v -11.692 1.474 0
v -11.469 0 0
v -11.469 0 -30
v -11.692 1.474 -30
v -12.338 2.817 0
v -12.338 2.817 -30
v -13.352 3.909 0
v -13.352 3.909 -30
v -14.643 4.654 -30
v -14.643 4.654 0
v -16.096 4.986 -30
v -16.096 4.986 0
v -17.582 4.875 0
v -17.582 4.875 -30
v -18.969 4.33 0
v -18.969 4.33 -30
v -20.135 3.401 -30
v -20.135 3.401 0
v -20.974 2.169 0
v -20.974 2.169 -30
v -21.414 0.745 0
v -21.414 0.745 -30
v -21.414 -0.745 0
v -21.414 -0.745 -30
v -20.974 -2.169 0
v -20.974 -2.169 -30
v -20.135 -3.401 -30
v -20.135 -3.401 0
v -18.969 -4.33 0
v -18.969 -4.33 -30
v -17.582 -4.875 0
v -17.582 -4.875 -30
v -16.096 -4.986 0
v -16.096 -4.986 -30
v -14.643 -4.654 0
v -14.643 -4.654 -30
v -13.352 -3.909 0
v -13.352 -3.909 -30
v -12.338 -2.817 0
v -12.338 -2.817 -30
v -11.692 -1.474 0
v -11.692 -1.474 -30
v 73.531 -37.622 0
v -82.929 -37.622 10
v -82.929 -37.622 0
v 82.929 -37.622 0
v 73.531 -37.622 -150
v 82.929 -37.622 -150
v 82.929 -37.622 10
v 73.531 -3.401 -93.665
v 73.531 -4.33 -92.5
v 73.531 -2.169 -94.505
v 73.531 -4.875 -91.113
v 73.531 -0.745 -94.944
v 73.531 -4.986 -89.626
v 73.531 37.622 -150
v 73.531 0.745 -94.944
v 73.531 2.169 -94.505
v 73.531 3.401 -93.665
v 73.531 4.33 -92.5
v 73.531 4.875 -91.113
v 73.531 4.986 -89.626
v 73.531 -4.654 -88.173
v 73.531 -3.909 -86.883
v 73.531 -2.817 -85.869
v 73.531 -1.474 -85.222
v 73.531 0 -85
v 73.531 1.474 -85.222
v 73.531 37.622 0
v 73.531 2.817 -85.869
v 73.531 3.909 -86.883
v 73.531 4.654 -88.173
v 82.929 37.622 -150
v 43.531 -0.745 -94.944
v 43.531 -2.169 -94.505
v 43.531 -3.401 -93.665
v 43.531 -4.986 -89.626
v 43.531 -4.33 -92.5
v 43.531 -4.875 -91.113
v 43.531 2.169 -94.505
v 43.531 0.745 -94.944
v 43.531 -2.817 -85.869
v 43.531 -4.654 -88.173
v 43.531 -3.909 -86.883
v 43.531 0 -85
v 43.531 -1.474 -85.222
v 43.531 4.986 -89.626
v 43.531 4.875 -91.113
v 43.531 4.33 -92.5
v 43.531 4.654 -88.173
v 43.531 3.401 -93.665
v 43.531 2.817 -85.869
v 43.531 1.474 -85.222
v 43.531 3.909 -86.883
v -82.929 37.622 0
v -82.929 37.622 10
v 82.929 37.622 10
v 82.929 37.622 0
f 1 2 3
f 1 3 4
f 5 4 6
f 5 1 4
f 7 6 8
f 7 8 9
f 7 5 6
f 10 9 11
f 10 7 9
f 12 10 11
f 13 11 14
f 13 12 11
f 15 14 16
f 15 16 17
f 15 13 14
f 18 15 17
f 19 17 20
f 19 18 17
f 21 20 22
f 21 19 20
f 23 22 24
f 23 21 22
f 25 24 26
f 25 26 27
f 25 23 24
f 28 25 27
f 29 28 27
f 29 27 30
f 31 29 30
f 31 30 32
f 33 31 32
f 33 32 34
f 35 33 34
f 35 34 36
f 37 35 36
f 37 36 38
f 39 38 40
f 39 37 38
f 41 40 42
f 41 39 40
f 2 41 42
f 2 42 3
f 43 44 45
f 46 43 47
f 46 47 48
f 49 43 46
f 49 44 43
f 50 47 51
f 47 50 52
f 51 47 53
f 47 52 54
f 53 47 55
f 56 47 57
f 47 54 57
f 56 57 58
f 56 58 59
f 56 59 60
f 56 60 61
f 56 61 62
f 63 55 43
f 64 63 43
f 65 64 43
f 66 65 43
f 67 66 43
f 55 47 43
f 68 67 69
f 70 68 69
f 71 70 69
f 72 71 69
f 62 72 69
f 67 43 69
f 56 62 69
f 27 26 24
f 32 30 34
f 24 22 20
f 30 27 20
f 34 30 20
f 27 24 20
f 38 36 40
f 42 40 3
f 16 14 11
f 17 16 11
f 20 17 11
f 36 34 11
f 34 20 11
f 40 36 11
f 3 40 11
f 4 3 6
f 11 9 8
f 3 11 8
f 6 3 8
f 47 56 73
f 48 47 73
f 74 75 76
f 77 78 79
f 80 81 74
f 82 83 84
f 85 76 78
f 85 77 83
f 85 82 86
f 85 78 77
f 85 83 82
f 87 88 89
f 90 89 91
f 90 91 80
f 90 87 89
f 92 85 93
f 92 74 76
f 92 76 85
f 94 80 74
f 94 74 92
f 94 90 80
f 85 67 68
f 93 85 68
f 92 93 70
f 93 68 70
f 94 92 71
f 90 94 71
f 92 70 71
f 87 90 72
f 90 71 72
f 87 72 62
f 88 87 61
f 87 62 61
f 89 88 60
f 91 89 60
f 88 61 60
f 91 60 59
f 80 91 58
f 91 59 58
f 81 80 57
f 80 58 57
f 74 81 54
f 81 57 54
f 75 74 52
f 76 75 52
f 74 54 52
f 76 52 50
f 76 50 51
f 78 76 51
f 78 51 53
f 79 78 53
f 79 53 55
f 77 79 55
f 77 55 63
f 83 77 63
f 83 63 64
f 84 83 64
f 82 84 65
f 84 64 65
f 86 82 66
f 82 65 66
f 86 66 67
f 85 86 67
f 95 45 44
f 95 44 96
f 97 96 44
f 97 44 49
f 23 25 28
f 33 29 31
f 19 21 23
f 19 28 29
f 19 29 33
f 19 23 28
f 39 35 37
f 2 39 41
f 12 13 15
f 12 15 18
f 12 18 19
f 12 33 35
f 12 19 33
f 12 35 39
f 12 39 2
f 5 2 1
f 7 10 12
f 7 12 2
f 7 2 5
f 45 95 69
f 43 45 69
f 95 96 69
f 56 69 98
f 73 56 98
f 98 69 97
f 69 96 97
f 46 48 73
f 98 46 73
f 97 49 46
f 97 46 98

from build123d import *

# Parameters (mm, degrees)
SKETCH1_W           = 165.858872534
SKETCH1_H           = 75.243046816
BOSS_EXTRUDE1_DEPTH = 10
SKETCH2_W           = 9.398863203
SKETCH2_H           = 75.243046816
BOSS_EXTRUDE2_DEPTH = 150
SKETCH4_R           = 5
BOSS_EXTRUDE3_DEPTH = 30
SKETCH5_R           = 5
BOSS_EXTRUDE4_DEPTH = 30


with BuildPart() as part:
    # Sketch1 → Boss-Extrude1 (new body)
    with BuildSketch(Plane.XY):
        Rectangle(SKETCH1_W, SKETCH1_H)
    extrude(amount=BOSS_EXTRUDE1_DEPTH)

    # Sketch2 → Boss-Extrude2 (add)
    with BuildSketch(Plane.XY):
        with Locations((78.230004666, 0)):
            Rectangle(SKETCH2_W, SKETCH2_H)
    extrude(amount=-BOSS_EXTRUDE2_DEPTH)

    # Sketch5 → Boss-Extrude4 (add)
    with BuildSketch(Plane.ZY.offset(-73.530573064)):
        with Locations((-90, 0)):
            Circle(SKETCH5_R)
    extrude(amount=BOSS_EXTRUDE4_DEPTH)


with BuildPart() as body_2:
    # Sketch4 → Boss-Extrude3 (new body)
    with BuildSketch(Plane.XY):
        with Locations((-16.469426936, 0)):
            Circle(SKETCH4_R)
    extrude(amount=-BOSS_EXTRUDE3_DEPTH)


solid = Compound([part.part, body_2.part])
